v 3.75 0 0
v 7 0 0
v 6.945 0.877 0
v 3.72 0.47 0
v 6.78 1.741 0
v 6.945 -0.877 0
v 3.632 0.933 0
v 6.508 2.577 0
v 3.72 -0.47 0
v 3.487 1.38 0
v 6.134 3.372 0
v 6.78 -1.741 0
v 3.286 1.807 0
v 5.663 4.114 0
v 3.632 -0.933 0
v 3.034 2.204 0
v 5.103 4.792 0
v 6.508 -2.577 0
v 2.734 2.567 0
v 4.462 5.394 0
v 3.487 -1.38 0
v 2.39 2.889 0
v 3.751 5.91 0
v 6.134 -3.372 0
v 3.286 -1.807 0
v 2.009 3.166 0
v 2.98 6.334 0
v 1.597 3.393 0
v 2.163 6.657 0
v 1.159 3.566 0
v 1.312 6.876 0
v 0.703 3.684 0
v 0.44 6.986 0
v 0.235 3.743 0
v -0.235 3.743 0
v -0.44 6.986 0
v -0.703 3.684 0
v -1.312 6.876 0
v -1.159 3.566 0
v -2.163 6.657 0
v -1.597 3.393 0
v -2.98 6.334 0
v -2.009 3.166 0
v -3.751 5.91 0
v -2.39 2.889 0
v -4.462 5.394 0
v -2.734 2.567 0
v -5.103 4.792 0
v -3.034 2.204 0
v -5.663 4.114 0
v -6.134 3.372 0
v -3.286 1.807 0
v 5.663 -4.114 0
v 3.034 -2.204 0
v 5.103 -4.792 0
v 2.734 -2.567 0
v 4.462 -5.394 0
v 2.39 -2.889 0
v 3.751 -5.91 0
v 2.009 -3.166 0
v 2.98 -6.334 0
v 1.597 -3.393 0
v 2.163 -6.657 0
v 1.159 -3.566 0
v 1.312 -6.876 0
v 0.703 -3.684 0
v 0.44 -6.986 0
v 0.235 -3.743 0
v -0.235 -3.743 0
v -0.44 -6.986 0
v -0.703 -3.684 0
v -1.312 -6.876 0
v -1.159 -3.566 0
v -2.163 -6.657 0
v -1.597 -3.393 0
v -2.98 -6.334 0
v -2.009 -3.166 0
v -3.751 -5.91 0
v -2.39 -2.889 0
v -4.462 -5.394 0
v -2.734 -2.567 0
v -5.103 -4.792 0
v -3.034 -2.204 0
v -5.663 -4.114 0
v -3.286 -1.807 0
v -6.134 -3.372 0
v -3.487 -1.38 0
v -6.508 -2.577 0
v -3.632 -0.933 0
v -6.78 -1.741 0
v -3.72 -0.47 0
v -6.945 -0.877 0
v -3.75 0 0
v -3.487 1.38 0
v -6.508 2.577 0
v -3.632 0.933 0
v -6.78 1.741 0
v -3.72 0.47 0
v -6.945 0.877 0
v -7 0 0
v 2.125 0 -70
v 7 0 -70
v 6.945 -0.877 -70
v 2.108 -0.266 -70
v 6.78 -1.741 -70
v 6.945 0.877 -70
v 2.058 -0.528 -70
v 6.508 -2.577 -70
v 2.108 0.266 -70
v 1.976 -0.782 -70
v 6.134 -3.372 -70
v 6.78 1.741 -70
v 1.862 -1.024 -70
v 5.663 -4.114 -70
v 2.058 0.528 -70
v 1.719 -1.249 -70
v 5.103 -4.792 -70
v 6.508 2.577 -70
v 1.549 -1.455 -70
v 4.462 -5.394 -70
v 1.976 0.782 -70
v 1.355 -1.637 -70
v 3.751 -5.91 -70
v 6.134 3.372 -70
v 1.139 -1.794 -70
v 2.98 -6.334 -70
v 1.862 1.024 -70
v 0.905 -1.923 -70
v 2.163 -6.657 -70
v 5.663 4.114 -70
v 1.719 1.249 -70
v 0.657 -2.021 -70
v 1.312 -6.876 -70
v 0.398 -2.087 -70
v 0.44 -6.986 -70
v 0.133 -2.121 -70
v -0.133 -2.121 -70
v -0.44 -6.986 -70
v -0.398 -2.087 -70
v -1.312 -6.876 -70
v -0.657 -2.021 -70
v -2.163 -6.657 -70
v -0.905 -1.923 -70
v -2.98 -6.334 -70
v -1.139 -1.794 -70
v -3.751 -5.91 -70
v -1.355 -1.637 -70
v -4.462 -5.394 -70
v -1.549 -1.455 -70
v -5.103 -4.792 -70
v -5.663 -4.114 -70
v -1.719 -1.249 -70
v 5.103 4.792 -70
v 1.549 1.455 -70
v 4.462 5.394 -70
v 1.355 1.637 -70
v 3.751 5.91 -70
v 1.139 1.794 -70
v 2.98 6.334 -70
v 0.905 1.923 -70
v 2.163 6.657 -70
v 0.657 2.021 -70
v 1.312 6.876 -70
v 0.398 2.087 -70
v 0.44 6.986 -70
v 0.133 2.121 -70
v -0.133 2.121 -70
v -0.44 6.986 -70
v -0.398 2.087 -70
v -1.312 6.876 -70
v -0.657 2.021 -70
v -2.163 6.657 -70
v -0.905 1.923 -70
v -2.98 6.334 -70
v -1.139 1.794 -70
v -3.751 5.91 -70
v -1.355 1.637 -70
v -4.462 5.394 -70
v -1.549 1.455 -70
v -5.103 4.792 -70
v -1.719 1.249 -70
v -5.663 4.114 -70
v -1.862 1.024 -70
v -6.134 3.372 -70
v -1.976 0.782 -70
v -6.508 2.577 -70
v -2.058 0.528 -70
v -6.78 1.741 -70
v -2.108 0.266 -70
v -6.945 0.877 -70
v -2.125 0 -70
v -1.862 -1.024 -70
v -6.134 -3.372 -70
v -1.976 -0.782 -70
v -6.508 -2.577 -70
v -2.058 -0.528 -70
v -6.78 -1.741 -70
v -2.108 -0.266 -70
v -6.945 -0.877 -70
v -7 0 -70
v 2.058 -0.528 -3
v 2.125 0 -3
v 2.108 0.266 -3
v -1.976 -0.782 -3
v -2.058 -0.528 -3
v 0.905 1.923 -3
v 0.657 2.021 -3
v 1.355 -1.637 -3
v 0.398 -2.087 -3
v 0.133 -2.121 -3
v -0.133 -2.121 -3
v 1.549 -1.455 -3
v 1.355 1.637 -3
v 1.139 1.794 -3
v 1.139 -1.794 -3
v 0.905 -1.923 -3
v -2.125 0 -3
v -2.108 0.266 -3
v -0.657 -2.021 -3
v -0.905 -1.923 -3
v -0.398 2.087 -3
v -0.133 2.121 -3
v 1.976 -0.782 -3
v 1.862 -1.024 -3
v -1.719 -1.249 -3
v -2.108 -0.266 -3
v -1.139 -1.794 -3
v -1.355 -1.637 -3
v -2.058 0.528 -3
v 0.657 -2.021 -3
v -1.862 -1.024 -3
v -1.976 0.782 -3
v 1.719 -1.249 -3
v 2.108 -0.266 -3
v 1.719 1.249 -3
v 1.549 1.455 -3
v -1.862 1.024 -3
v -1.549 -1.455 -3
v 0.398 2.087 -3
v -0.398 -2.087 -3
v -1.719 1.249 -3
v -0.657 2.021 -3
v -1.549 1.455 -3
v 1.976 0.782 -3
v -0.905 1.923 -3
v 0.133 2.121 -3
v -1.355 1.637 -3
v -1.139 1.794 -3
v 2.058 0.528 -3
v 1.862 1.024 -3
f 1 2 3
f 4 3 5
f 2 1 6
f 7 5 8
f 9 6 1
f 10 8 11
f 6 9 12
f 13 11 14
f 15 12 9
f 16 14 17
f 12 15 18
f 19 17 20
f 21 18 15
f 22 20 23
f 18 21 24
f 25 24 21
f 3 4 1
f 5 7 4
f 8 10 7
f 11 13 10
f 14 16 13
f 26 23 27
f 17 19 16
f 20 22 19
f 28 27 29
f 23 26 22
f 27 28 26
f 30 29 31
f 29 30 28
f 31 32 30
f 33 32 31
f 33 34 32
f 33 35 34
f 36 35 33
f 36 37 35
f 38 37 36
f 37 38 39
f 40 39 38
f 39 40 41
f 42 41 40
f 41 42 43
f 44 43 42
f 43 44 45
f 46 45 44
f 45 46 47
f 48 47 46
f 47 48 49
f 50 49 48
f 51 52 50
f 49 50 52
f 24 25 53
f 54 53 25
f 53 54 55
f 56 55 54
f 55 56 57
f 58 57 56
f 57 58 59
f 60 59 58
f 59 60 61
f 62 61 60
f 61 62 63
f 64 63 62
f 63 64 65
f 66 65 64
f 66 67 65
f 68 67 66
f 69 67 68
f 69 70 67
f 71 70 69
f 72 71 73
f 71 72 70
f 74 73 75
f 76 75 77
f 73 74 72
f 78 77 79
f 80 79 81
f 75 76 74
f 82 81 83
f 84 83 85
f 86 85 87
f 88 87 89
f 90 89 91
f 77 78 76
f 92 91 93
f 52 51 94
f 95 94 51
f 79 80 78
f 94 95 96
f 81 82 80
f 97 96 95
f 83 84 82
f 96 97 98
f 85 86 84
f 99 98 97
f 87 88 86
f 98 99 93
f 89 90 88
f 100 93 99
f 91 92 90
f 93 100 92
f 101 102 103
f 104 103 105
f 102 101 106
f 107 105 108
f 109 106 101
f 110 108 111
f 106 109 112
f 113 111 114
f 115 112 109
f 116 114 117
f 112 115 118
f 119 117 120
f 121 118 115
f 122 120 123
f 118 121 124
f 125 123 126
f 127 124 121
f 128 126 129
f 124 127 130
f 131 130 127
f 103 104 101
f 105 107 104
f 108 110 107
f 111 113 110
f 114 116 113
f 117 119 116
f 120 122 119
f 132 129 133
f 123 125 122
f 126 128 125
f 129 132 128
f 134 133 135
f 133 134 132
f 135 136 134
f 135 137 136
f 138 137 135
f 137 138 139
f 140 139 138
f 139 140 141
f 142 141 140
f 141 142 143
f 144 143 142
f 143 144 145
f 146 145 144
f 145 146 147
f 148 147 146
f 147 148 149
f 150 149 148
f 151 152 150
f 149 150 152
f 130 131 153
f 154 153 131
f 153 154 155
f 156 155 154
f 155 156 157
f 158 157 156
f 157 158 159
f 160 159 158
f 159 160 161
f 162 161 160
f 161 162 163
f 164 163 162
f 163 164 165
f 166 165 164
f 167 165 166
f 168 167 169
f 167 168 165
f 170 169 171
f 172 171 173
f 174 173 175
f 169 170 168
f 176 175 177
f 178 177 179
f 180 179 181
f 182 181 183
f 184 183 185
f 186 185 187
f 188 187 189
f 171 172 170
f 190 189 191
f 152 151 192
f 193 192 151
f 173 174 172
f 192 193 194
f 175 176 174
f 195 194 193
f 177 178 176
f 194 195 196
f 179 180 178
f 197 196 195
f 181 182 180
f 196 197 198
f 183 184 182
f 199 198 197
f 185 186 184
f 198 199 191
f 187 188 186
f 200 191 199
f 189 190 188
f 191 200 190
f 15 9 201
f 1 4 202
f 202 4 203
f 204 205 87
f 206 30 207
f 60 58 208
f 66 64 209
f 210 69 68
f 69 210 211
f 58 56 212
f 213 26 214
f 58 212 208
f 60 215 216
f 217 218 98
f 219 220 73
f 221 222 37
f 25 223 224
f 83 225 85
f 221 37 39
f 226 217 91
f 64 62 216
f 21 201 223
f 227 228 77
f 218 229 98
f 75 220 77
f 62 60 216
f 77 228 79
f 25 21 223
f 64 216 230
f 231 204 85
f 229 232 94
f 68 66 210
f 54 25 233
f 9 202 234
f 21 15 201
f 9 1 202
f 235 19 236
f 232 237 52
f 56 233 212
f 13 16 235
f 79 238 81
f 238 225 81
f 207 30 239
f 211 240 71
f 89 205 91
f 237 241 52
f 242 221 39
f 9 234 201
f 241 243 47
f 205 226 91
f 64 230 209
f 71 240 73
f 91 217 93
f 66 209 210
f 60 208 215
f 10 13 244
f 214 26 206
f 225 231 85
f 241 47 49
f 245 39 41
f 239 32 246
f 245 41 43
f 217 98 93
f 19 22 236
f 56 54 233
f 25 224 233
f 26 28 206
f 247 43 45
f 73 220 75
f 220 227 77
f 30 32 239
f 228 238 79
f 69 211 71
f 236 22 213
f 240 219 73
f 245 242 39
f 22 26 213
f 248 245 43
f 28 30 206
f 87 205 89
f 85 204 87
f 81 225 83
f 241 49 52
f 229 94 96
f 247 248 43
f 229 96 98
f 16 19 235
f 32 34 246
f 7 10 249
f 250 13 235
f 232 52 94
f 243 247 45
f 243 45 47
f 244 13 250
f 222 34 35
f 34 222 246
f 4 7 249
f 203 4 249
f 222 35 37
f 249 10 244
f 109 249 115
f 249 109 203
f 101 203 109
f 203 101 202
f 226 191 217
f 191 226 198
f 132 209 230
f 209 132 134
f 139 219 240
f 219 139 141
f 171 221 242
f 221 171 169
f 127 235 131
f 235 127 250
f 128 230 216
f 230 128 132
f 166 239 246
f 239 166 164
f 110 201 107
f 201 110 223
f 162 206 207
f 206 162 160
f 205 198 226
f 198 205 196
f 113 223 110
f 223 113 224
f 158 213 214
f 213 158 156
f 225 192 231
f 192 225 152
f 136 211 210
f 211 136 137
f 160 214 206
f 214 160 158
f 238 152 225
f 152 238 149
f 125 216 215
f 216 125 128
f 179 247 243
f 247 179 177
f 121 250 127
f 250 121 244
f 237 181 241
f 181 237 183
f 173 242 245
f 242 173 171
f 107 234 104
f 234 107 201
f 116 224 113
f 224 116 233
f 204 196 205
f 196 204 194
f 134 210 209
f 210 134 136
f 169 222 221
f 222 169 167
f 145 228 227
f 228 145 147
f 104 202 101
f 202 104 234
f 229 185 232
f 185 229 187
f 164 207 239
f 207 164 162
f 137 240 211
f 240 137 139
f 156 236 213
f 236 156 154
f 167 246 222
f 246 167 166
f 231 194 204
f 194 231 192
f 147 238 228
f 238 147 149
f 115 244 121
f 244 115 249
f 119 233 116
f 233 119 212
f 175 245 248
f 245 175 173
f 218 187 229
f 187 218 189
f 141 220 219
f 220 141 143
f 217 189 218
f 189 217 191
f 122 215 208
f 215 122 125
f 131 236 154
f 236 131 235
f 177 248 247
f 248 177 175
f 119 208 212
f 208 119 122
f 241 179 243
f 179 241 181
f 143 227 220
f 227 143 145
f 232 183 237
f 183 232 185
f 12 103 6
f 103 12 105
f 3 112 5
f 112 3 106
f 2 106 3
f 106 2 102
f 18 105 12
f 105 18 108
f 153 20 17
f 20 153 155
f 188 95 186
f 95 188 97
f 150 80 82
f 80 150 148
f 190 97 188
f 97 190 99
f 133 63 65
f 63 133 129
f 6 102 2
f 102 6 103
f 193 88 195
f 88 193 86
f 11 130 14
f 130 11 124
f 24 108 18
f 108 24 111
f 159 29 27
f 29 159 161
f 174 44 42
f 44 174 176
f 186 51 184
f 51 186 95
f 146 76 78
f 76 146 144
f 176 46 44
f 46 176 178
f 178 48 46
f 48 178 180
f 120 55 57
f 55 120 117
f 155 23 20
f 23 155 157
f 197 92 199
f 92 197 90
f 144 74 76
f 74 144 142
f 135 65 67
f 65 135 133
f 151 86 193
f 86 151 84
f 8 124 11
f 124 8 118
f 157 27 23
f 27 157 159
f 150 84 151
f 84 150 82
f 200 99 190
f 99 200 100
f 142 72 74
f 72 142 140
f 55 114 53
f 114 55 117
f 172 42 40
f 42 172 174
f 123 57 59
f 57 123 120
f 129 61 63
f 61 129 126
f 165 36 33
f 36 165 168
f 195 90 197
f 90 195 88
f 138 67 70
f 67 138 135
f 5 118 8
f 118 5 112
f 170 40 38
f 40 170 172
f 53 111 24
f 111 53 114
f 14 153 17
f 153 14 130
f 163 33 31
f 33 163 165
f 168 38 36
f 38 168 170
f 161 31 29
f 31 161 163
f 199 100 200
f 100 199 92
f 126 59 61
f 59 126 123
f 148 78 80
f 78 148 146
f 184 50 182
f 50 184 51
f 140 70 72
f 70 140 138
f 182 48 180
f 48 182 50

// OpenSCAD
$fn = 50;


difference() {
	union() {
		translate(v = [0, 0, -70.0000000000]) {
			cylinder(h = 70, r = 7.0000000000);
		}
		cylinder(h = 0, r = 17.0000000000);
	}
	union() {
		translate(v = [0, 0, 0]) {
			rotate(a = [0, 0, 0]) {
				difference() {
					union() {
						#translate(v = [0, 0, -70.0000000000]) {
							cylinder(h = 70, r = 2.0000000000);
						}
						#translate(v = [0, 0, -3]) {
							cylinder(h = 3, r1 = 2.1250000000, r2 = 3.7500000000);
						}
						#translate(v = [0, 0, -70.0000000000]) {
							cylinder(h = 70, r = 2.1250000000);
						}
						#translate(v = [0, 0, -70.0000000000]) {
							cylinder(h = 70, r = 2.0000000000);
						}
					}
					union();
				}
			}
		}
	}
}
